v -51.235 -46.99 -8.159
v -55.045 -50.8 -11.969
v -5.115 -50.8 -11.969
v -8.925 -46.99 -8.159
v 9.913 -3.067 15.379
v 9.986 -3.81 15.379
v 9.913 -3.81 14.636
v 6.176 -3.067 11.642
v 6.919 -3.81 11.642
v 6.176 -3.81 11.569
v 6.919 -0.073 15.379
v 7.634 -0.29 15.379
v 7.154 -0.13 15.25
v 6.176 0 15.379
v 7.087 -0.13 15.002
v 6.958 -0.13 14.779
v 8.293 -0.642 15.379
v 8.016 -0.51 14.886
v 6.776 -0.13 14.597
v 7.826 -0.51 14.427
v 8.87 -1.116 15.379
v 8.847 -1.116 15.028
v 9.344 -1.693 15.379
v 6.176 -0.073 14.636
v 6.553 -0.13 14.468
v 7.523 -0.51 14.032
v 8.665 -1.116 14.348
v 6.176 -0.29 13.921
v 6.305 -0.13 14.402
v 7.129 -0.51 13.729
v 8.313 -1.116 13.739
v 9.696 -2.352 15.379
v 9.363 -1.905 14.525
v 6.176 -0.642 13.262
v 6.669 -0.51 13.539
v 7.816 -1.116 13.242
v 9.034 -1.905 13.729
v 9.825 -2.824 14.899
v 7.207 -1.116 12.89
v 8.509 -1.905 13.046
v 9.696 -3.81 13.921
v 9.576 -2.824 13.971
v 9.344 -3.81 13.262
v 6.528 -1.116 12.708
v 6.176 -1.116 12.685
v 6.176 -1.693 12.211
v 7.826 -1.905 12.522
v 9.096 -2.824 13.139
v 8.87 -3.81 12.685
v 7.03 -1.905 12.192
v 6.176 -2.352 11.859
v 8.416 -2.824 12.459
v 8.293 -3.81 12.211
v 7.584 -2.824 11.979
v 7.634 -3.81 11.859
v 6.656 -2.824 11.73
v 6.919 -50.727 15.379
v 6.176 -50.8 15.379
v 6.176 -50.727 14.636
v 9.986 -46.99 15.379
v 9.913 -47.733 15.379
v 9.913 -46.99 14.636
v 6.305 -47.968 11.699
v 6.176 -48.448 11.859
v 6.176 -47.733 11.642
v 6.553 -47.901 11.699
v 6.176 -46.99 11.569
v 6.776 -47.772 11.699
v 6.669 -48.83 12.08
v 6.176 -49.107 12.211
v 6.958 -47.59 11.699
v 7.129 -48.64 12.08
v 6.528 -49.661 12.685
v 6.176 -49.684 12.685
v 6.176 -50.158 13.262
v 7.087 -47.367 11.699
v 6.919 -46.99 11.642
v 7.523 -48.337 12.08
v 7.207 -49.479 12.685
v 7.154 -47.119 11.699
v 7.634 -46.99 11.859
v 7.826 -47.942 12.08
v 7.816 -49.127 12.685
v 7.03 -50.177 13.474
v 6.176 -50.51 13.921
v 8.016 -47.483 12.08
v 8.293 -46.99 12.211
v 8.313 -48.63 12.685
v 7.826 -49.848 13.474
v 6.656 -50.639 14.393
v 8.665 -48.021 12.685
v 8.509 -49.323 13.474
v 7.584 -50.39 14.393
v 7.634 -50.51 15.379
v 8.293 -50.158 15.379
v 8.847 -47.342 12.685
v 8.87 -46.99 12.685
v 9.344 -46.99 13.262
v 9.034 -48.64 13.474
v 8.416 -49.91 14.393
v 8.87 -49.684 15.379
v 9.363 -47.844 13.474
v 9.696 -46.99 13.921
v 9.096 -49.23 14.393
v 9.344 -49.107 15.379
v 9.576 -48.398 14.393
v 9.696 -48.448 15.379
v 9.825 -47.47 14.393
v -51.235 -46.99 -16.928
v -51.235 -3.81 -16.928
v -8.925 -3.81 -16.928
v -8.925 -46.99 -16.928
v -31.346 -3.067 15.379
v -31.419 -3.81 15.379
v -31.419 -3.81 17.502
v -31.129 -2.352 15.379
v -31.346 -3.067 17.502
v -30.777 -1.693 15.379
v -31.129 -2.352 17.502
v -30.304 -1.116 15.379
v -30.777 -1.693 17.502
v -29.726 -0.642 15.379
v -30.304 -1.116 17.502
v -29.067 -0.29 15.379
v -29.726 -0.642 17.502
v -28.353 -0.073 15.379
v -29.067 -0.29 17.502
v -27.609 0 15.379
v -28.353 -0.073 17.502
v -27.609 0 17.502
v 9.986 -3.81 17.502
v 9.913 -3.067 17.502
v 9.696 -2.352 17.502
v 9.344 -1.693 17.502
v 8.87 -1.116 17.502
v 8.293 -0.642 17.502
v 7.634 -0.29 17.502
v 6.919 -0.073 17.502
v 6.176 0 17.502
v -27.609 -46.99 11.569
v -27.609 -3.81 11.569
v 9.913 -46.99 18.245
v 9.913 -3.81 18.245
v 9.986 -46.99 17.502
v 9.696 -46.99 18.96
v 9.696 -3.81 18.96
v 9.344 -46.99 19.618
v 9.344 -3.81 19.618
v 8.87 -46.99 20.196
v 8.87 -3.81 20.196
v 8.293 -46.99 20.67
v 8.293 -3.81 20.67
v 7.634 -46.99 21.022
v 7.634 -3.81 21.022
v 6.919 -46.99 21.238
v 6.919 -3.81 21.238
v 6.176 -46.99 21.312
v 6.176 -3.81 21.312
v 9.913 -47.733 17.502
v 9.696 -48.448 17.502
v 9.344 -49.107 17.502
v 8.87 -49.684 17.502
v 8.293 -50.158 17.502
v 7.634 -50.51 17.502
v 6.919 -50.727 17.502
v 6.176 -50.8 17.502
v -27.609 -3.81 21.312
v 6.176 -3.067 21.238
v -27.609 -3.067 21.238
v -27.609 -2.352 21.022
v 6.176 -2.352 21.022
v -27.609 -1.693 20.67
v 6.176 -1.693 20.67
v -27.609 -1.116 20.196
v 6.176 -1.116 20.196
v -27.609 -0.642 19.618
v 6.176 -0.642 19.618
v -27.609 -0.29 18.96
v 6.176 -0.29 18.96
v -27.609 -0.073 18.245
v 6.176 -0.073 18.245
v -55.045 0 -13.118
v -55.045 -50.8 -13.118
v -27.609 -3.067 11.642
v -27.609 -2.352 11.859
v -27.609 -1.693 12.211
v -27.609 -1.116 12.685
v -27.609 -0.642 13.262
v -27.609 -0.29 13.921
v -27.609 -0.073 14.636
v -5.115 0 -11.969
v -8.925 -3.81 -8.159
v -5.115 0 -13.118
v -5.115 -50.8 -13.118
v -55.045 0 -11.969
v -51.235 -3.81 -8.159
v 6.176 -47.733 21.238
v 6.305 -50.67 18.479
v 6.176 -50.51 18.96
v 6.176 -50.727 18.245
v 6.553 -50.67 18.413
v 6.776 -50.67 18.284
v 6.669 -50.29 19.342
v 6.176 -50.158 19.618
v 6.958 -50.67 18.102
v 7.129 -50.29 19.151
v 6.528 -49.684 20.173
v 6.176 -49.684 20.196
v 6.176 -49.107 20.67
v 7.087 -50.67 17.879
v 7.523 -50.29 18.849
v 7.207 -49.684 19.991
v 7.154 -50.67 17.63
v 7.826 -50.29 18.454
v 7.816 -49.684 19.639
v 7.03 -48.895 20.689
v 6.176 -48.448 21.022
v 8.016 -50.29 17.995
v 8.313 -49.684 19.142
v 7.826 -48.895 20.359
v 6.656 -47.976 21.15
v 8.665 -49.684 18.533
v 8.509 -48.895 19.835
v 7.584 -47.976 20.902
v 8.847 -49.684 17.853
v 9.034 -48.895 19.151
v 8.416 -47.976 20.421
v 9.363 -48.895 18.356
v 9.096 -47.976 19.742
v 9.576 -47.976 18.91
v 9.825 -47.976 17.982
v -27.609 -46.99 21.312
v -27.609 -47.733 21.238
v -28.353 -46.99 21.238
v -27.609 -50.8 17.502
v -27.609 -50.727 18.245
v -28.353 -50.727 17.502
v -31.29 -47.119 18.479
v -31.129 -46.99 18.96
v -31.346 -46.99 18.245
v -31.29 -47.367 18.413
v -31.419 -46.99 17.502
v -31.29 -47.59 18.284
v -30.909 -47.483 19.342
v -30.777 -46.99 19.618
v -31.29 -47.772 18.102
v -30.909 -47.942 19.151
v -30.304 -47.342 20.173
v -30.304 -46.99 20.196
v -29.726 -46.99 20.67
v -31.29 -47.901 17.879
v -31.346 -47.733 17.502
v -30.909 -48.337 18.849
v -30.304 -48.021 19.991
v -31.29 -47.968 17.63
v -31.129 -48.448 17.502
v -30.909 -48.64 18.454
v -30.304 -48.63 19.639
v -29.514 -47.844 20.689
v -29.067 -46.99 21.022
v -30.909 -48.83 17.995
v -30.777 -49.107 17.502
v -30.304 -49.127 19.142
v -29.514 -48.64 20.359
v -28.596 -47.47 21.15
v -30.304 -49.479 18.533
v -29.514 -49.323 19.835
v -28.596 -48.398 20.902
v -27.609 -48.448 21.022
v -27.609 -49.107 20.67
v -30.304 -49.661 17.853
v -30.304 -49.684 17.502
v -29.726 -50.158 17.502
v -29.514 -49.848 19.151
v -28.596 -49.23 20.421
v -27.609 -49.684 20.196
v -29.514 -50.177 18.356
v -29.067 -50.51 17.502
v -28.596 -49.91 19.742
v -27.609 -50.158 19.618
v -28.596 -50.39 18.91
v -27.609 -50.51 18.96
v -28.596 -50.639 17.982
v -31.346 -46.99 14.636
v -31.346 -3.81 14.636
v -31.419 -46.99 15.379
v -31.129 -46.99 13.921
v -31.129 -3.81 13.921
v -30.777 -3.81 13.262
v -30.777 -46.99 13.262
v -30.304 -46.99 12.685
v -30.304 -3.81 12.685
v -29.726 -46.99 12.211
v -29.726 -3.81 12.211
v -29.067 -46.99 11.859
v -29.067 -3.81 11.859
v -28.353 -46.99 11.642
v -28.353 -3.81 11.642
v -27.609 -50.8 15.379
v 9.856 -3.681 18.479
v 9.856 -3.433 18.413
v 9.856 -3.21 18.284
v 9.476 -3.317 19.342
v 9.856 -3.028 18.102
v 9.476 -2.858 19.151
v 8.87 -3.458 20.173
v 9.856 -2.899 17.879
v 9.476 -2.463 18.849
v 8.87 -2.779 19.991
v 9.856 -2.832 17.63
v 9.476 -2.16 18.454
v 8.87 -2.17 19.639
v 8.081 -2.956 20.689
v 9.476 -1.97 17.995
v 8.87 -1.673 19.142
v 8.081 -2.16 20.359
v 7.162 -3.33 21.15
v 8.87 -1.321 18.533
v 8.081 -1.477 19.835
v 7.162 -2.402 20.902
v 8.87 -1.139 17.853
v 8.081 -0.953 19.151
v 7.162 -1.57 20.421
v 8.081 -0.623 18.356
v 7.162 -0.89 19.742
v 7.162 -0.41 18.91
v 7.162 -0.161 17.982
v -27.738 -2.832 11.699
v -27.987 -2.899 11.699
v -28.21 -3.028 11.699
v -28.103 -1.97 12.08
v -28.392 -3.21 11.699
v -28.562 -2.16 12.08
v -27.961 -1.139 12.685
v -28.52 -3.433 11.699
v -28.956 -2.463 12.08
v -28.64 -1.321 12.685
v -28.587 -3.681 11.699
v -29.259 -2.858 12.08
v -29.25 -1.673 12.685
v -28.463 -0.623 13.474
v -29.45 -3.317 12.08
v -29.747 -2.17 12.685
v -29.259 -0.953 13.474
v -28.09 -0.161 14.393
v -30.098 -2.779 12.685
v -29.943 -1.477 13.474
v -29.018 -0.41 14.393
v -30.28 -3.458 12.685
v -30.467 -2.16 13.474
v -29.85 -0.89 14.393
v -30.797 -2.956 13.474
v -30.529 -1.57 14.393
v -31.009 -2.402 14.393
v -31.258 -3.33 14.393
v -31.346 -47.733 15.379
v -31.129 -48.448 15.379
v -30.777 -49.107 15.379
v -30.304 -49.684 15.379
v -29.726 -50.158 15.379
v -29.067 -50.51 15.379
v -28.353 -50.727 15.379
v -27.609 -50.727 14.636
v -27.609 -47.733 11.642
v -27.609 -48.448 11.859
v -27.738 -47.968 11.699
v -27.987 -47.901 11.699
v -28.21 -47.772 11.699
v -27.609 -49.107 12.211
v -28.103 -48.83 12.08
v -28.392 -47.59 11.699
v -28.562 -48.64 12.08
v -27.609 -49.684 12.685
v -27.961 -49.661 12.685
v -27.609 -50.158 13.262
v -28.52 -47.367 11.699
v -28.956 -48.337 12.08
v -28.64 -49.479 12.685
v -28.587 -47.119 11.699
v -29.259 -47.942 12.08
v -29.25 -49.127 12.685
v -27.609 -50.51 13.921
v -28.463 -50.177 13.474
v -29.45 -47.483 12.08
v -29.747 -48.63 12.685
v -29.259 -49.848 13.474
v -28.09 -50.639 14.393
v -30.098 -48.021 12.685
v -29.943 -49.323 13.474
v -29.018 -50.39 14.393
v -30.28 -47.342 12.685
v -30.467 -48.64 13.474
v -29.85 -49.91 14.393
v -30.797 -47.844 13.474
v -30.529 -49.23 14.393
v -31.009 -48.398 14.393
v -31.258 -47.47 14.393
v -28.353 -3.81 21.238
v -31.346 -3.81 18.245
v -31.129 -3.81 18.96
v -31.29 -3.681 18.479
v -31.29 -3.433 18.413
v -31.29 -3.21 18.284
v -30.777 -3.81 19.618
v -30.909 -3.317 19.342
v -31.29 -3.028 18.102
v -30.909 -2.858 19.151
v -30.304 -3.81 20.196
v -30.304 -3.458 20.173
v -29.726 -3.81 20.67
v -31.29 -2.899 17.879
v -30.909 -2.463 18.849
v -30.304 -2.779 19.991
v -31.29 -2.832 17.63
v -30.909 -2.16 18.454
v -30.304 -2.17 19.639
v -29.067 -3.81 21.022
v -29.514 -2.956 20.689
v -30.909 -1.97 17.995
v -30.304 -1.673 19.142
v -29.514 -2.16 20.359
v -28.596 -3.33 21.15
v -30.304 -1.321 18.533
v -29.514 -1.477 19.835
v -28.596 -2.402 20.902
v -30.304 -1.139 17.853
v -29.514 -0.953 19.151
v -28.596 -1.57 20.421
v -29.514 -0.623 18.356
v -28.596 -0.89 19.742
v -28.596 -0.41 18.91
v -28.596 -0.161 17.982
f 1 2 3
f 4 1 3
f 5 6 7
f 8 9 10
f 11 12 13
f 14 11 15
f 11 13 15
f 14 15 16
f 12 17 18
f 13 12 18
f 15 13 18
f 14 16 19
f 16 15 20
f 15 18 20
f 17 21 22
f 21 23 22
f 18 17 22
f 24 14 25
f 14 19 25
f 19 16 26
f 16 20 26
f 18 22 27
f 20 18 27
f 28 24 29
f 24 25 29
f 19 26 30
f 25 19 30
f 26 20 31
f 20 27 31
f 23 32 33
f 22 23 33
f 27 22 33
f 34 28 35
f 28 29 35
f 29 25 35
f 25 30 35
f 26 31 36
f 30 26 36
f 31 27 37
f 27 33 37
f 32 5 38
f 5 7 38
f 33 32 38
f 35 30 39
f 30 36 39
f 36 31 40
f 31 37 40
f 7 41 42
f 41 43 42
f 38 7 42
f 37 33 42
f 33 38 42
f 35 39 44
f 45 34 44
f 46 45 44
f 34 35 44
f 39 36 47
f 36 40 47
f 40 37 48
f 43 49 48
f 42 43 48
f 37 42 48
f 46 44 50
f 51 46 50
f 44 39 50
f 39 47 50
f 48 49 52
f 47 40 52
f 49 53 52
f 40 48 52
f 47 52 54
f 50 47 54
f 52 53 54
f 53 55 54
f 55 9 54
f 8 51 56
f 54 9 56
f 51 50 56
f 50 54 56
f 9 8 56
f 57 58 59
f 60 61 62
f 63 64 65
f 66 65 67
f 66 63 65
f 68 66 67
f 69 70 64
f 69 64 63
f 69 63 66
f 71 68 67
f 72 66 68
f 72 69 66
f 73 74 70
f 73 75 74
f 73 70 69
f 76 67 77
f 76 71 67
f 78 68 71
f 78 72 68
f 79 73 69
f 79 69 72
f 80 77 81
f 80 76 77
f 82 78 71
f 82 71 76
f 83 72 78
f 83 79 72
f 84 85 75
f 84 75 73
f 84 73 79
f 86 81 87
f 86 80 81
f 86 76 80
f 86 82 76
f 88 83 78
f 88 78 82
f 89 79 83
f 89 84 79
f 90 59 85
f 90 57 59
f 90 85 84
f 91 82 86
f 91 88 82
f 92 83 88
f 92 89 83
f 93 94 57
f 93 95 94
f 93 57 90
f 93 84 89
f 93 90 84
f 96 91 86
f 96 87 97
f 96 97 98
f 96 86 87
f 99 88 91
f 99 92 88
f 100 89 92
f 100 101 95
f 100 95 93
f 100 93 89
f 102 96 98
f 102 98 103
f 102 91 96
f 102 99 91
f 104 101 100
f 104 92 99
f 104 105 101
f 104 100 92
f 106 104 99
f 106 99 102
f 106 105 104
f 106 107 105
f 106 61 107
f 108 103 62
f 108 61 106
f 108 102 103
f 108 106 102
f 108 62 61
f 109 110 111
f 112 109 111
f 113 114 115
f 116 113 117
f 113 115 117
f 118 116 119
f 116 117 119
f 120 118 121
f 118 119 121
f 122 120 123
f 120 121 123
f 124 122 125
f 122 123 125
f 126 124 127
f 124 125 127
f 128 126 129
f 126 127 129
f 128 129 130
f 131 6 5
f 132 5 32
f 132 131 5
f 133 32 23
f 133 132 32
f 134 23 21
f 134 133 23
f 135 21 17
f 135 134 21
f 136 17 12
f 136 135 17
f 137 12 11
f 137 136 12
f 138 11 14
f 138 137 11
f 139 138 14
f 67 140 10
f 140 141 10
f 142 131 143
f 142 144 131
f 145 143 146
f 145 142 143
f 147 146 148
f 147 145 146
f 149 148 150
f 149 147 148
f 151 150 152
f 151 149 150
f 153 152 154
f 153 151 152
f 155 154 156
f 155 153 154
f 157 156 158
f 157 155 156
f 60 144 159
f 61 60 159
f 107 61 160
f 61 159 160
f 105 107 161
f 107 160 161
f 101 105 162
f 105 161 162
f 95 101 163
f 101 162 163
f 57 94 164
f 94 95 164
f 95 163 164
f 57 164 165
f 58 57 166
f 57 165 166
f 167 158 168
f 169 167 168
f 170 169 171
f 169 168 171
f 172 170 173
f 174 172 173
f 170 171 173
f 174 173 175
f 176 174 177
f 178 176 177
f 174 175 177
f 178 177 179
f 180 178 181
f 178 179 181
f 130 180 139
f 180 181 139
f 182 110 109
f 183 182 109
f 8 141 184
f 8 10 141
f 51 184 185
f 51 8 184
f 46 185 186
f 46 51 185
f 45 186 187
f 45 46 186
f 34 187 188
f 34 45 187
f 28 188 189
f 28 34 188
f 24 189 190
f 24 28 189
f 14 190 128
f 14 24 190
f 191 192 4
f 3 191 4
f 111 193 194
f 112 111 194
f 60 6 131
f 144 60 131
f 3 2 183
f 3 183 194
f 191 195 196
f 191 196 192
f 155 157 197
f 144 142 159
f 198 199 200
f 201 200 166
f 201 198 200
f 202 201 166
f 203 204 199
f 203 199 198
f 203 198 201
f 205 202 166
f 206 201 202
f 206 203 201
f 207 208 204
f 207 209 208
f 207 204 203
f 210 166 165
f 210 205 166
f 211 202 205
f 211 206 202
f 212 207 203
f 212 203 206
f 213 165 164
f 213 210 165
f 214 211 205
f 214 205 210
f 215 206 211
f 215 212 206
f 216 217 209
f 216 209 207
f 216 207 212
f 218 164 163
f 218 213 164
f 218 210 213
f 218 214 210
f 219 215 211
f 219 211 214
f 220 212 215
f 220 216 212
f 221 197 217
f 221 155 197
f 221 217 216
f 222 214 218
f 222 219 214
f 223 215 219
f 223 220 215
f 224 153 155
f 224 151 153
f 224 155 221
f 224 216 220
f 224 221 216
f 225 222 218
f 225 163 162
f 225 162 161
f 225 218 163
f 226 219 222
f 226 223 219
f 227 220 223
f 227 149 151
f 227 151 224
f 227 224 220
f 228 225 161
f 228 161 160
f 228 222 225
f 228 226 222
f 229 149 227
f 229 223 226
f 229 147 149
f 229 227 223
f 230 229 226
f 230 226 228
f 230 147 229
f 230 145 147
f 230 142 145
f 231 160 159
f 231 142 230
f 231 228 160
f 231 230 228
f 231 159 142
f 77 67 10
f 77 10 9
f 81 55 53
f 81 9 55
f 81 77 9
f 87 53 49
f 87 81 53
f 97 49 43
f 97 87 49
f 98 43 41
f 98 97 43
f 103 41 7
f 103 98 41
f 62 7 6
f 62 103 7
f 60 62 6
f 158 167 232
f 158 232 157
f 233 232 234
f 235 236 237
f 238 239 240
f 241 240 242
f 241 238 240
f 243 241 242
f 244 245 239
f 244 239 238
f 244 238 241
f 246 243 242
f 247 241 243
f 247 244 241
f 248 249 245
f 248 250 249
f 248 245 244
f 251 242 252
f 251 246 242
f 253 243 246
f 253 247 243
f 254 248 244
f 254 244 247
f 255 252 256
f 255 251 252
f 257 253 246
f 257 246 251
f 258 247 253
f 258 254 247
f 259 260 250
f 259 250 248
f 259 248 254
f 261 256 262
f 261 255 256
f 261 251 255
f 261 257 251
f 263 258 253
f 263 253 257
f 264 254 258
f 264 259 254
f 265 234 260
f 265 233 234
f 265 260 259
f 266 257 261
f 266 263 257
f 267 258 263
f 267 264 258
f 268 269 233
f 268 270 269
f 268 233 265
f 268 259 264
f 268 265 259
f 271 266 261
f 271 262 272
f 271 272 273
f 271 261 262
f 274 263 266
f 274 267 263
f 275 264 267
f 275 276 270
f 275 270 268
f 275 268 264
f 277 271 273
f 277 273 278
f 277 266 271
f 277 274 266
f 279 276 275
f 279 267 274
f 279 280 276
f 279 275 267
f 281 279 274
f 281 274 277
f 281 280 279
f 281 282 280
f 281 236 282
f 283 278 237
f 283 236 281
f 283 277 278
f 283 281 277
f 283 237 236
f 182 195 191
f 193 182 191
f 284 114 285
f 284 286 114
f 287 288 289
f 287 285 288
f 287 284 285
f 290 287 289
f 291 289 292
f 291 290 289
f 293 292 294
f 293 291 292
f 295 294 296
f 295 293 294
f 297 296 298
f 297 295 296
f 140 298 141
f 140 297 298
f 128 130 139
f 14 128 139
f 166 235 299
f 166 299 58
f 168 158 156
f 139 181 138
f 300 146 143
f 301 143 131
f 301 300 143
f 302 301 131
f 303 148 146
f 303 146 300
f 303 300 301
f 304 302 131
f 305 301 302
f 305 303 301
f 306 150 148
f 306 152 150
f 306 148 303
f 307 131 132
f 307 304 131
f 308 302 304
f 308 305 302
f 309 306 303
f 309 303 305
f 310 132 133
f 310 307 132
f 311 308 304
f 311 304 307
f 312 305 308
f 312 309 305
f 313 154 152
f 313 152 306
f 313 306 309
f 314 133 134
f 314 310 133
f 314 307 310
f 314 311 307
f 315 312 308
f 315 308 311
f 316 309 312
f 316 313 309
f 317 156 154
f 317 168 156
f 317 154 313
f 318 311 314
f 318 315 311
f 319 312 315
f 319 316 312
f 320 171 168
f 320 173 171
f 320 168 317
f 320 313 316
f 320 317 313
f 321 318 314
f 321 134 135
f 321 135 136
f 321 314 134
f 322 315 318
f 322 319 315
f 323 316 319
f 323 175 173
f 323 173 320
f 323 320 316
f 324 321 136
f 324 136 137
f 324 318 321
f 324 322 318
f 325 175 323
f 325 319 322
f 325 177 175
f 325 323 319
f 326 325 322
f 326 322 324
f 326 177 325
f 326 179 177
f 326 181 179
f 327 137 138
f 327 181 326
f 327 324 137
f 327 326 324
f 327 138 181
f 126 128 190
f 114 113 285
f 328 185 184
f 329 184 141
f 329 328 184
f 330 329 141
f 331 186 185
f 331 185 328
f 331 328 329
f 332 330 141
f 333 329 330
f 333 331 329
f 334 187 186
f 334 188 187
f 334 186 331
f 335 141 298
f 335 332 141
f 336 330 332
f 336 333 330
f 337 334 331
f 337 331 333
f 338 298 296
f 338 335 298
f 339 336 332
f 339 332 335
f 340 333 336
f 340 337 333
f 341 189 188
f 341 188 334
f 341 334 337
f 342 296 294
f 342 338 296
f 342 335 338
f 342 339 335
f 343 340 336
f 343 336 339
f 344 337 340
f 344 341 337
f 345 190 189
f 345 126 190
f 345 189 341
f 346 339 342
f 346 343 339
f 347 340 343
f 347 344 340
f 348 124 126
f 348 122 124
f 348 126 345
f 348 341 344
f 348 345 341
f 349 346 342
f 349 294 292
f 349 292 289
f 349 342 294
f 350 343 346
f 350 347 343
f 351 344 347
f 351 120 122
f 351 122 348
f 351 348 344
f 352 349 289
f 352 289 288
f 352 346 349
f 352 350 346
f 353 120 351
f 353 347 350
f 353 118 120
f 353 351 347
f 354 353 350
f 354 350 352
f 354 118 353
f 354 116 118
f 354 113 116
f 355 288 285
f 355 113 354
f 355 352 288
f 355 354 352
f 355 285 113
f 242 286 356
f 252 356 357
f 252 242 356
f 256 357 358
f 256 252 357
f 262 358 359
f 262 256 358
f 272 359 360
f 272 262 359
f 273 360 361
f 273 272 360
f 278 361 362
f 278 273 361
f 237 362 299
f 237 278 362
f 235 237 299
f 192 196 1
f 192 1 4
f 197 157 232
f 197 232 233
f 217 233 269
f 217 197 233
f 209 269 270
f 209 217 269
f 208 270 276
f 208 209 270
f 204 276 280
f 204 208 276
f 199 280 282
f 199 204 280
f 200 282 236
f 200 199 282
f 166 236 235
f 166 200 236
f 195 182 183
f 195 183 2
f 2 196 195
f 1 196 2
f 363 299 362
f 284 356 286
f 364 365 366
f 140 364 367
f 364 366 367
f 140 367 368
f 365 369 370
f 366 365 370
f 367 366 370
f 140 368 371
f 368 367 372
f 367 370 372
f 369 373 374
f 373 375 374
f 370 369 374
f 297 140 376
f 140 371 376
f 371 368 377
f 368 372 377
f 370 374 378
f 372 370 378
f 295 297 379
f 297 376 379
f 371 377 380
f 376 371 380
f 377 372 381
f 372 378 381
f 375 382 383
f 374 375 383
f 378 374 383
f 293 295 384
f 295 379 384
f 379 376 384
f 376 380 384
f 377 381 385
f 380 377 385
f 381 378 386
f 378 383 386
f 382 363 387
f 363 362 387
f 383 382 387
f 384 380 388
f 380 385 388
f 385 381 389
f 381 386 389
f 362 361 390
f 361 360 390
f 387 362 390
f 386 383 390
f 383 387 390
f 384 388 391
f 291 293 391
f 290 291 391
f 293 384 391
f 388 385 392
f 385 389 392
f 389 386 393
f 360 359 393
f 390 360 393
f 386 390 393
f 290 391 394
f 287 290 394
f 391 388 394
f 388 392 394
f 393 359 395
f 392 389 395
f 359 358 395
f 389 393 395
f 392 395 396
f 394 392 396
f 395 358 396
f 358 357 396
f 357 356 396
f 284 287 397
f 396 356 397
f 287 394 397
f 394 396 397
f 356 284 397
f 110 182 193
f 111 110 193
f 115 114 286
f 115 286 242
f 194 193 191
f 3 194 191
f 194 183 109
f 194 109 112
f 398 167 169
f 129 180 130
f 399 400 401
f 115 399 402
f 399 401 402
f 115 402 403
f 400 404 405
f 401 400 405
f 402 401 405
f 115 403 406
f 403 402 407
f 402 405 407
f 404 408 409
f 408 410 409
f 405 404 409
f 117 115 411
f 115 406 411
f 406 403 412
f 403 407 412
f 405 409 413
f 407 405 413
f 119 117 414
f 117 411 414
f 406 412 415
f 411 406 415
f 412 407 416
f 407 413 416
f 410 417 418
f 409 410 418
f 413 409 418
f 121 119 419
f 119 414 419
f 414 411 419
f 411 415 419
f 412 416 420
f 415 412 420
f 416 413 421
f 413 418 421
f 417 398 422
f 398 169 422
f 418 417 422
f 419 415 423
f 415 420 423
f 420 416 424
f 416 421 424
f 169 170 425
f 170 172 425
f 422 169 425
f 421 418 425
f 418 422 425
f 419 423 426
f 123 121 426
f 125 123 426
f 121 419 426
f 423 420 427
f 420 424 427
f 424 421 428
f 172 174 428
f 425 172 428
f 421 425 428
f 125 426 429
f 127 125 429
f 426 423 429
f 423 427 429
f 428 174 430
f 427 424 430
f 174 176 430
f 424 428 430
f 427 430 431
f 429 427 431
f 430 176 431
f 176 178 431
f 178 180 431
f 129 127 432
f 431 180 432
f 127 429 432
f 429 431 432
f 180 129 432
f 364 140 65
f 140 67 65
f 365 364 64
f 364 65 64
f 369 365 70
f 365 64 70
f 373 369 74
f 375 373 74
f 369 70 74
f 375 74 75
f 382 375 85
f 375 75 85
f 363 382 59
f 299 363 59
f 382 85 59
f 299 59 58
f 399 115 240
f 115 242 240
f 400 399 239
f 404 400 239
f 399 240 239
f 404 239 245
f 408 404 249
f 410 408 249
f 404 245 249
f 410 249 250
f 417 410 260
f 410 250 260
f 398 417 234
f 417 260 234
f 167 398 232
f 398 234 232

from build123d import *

# Parameters (mm, degrees)
F0_W     = 49.930133
F0_H     = 8.76822
F0_W_2   = 41.40548
F0_H_2   = 9.742465
F1_DEPTH = 50.8
F2_R     = 3.81
F3_SIZE  = 3.81


with BuildPart() as f1:
    # F0 (on Front) → F1 (new body)
    with BuildSketch(Plane.XZ):
        with Locations((-30.079864, -12.543425)):
            Rectangle(F0_W, F0_H)
        with Locations((-10.716712, 16.440411)):
            Rectangle(F0_W_2, F0_H_2)
    extrude(amount=F1_DEPTH)

    # F2
    f2_edges = [f1.edges().sort_by_distance(p)[0] for p in [
        (-10.716712, 0, 21.311644),
        (9.986028, -25.4, 21.311644),
        (-10.716712, -50.8, 21.311644),
        (-31.419452, -25.4, 21.311644),
        (9.986028, -50.8, 16.440412),
        (-31.419452, -50.8, 16.440412),
        (-10.716712, -50.8, 11.569179),
        (9.986028, -25.4, 11.569179),
        (9.986028, 0, 16.440412),
        (-31.419452, 0, 16.440412),
        (-10.716712, 0, 11.569179),
        (-31.419452, -25.4, 11.569179),
    ]]
    fillet(f2_edges, radius=F2_R)

    # F3
    f3_edges = [f1.edges().sort_by_distance(p)[0] for p in [
        (-30.079863, 0, -8.159315),
        (-30.079863, 0, -16.927535),
        (-55.04493, -25.4, -8.159315),
        (-55.04493, -25.4, -16.927535),
        (-5.114797, -25.4, -8.159315),
        (-30.079863, -50.8, -8.159315),
        (-30.079863, -50.8, -16.927535),
        (-5.114797, -25.4, -16.927535),
    ]]
    chamfer(f3_edges, length=F3_SIZE)


solid = f1.part
